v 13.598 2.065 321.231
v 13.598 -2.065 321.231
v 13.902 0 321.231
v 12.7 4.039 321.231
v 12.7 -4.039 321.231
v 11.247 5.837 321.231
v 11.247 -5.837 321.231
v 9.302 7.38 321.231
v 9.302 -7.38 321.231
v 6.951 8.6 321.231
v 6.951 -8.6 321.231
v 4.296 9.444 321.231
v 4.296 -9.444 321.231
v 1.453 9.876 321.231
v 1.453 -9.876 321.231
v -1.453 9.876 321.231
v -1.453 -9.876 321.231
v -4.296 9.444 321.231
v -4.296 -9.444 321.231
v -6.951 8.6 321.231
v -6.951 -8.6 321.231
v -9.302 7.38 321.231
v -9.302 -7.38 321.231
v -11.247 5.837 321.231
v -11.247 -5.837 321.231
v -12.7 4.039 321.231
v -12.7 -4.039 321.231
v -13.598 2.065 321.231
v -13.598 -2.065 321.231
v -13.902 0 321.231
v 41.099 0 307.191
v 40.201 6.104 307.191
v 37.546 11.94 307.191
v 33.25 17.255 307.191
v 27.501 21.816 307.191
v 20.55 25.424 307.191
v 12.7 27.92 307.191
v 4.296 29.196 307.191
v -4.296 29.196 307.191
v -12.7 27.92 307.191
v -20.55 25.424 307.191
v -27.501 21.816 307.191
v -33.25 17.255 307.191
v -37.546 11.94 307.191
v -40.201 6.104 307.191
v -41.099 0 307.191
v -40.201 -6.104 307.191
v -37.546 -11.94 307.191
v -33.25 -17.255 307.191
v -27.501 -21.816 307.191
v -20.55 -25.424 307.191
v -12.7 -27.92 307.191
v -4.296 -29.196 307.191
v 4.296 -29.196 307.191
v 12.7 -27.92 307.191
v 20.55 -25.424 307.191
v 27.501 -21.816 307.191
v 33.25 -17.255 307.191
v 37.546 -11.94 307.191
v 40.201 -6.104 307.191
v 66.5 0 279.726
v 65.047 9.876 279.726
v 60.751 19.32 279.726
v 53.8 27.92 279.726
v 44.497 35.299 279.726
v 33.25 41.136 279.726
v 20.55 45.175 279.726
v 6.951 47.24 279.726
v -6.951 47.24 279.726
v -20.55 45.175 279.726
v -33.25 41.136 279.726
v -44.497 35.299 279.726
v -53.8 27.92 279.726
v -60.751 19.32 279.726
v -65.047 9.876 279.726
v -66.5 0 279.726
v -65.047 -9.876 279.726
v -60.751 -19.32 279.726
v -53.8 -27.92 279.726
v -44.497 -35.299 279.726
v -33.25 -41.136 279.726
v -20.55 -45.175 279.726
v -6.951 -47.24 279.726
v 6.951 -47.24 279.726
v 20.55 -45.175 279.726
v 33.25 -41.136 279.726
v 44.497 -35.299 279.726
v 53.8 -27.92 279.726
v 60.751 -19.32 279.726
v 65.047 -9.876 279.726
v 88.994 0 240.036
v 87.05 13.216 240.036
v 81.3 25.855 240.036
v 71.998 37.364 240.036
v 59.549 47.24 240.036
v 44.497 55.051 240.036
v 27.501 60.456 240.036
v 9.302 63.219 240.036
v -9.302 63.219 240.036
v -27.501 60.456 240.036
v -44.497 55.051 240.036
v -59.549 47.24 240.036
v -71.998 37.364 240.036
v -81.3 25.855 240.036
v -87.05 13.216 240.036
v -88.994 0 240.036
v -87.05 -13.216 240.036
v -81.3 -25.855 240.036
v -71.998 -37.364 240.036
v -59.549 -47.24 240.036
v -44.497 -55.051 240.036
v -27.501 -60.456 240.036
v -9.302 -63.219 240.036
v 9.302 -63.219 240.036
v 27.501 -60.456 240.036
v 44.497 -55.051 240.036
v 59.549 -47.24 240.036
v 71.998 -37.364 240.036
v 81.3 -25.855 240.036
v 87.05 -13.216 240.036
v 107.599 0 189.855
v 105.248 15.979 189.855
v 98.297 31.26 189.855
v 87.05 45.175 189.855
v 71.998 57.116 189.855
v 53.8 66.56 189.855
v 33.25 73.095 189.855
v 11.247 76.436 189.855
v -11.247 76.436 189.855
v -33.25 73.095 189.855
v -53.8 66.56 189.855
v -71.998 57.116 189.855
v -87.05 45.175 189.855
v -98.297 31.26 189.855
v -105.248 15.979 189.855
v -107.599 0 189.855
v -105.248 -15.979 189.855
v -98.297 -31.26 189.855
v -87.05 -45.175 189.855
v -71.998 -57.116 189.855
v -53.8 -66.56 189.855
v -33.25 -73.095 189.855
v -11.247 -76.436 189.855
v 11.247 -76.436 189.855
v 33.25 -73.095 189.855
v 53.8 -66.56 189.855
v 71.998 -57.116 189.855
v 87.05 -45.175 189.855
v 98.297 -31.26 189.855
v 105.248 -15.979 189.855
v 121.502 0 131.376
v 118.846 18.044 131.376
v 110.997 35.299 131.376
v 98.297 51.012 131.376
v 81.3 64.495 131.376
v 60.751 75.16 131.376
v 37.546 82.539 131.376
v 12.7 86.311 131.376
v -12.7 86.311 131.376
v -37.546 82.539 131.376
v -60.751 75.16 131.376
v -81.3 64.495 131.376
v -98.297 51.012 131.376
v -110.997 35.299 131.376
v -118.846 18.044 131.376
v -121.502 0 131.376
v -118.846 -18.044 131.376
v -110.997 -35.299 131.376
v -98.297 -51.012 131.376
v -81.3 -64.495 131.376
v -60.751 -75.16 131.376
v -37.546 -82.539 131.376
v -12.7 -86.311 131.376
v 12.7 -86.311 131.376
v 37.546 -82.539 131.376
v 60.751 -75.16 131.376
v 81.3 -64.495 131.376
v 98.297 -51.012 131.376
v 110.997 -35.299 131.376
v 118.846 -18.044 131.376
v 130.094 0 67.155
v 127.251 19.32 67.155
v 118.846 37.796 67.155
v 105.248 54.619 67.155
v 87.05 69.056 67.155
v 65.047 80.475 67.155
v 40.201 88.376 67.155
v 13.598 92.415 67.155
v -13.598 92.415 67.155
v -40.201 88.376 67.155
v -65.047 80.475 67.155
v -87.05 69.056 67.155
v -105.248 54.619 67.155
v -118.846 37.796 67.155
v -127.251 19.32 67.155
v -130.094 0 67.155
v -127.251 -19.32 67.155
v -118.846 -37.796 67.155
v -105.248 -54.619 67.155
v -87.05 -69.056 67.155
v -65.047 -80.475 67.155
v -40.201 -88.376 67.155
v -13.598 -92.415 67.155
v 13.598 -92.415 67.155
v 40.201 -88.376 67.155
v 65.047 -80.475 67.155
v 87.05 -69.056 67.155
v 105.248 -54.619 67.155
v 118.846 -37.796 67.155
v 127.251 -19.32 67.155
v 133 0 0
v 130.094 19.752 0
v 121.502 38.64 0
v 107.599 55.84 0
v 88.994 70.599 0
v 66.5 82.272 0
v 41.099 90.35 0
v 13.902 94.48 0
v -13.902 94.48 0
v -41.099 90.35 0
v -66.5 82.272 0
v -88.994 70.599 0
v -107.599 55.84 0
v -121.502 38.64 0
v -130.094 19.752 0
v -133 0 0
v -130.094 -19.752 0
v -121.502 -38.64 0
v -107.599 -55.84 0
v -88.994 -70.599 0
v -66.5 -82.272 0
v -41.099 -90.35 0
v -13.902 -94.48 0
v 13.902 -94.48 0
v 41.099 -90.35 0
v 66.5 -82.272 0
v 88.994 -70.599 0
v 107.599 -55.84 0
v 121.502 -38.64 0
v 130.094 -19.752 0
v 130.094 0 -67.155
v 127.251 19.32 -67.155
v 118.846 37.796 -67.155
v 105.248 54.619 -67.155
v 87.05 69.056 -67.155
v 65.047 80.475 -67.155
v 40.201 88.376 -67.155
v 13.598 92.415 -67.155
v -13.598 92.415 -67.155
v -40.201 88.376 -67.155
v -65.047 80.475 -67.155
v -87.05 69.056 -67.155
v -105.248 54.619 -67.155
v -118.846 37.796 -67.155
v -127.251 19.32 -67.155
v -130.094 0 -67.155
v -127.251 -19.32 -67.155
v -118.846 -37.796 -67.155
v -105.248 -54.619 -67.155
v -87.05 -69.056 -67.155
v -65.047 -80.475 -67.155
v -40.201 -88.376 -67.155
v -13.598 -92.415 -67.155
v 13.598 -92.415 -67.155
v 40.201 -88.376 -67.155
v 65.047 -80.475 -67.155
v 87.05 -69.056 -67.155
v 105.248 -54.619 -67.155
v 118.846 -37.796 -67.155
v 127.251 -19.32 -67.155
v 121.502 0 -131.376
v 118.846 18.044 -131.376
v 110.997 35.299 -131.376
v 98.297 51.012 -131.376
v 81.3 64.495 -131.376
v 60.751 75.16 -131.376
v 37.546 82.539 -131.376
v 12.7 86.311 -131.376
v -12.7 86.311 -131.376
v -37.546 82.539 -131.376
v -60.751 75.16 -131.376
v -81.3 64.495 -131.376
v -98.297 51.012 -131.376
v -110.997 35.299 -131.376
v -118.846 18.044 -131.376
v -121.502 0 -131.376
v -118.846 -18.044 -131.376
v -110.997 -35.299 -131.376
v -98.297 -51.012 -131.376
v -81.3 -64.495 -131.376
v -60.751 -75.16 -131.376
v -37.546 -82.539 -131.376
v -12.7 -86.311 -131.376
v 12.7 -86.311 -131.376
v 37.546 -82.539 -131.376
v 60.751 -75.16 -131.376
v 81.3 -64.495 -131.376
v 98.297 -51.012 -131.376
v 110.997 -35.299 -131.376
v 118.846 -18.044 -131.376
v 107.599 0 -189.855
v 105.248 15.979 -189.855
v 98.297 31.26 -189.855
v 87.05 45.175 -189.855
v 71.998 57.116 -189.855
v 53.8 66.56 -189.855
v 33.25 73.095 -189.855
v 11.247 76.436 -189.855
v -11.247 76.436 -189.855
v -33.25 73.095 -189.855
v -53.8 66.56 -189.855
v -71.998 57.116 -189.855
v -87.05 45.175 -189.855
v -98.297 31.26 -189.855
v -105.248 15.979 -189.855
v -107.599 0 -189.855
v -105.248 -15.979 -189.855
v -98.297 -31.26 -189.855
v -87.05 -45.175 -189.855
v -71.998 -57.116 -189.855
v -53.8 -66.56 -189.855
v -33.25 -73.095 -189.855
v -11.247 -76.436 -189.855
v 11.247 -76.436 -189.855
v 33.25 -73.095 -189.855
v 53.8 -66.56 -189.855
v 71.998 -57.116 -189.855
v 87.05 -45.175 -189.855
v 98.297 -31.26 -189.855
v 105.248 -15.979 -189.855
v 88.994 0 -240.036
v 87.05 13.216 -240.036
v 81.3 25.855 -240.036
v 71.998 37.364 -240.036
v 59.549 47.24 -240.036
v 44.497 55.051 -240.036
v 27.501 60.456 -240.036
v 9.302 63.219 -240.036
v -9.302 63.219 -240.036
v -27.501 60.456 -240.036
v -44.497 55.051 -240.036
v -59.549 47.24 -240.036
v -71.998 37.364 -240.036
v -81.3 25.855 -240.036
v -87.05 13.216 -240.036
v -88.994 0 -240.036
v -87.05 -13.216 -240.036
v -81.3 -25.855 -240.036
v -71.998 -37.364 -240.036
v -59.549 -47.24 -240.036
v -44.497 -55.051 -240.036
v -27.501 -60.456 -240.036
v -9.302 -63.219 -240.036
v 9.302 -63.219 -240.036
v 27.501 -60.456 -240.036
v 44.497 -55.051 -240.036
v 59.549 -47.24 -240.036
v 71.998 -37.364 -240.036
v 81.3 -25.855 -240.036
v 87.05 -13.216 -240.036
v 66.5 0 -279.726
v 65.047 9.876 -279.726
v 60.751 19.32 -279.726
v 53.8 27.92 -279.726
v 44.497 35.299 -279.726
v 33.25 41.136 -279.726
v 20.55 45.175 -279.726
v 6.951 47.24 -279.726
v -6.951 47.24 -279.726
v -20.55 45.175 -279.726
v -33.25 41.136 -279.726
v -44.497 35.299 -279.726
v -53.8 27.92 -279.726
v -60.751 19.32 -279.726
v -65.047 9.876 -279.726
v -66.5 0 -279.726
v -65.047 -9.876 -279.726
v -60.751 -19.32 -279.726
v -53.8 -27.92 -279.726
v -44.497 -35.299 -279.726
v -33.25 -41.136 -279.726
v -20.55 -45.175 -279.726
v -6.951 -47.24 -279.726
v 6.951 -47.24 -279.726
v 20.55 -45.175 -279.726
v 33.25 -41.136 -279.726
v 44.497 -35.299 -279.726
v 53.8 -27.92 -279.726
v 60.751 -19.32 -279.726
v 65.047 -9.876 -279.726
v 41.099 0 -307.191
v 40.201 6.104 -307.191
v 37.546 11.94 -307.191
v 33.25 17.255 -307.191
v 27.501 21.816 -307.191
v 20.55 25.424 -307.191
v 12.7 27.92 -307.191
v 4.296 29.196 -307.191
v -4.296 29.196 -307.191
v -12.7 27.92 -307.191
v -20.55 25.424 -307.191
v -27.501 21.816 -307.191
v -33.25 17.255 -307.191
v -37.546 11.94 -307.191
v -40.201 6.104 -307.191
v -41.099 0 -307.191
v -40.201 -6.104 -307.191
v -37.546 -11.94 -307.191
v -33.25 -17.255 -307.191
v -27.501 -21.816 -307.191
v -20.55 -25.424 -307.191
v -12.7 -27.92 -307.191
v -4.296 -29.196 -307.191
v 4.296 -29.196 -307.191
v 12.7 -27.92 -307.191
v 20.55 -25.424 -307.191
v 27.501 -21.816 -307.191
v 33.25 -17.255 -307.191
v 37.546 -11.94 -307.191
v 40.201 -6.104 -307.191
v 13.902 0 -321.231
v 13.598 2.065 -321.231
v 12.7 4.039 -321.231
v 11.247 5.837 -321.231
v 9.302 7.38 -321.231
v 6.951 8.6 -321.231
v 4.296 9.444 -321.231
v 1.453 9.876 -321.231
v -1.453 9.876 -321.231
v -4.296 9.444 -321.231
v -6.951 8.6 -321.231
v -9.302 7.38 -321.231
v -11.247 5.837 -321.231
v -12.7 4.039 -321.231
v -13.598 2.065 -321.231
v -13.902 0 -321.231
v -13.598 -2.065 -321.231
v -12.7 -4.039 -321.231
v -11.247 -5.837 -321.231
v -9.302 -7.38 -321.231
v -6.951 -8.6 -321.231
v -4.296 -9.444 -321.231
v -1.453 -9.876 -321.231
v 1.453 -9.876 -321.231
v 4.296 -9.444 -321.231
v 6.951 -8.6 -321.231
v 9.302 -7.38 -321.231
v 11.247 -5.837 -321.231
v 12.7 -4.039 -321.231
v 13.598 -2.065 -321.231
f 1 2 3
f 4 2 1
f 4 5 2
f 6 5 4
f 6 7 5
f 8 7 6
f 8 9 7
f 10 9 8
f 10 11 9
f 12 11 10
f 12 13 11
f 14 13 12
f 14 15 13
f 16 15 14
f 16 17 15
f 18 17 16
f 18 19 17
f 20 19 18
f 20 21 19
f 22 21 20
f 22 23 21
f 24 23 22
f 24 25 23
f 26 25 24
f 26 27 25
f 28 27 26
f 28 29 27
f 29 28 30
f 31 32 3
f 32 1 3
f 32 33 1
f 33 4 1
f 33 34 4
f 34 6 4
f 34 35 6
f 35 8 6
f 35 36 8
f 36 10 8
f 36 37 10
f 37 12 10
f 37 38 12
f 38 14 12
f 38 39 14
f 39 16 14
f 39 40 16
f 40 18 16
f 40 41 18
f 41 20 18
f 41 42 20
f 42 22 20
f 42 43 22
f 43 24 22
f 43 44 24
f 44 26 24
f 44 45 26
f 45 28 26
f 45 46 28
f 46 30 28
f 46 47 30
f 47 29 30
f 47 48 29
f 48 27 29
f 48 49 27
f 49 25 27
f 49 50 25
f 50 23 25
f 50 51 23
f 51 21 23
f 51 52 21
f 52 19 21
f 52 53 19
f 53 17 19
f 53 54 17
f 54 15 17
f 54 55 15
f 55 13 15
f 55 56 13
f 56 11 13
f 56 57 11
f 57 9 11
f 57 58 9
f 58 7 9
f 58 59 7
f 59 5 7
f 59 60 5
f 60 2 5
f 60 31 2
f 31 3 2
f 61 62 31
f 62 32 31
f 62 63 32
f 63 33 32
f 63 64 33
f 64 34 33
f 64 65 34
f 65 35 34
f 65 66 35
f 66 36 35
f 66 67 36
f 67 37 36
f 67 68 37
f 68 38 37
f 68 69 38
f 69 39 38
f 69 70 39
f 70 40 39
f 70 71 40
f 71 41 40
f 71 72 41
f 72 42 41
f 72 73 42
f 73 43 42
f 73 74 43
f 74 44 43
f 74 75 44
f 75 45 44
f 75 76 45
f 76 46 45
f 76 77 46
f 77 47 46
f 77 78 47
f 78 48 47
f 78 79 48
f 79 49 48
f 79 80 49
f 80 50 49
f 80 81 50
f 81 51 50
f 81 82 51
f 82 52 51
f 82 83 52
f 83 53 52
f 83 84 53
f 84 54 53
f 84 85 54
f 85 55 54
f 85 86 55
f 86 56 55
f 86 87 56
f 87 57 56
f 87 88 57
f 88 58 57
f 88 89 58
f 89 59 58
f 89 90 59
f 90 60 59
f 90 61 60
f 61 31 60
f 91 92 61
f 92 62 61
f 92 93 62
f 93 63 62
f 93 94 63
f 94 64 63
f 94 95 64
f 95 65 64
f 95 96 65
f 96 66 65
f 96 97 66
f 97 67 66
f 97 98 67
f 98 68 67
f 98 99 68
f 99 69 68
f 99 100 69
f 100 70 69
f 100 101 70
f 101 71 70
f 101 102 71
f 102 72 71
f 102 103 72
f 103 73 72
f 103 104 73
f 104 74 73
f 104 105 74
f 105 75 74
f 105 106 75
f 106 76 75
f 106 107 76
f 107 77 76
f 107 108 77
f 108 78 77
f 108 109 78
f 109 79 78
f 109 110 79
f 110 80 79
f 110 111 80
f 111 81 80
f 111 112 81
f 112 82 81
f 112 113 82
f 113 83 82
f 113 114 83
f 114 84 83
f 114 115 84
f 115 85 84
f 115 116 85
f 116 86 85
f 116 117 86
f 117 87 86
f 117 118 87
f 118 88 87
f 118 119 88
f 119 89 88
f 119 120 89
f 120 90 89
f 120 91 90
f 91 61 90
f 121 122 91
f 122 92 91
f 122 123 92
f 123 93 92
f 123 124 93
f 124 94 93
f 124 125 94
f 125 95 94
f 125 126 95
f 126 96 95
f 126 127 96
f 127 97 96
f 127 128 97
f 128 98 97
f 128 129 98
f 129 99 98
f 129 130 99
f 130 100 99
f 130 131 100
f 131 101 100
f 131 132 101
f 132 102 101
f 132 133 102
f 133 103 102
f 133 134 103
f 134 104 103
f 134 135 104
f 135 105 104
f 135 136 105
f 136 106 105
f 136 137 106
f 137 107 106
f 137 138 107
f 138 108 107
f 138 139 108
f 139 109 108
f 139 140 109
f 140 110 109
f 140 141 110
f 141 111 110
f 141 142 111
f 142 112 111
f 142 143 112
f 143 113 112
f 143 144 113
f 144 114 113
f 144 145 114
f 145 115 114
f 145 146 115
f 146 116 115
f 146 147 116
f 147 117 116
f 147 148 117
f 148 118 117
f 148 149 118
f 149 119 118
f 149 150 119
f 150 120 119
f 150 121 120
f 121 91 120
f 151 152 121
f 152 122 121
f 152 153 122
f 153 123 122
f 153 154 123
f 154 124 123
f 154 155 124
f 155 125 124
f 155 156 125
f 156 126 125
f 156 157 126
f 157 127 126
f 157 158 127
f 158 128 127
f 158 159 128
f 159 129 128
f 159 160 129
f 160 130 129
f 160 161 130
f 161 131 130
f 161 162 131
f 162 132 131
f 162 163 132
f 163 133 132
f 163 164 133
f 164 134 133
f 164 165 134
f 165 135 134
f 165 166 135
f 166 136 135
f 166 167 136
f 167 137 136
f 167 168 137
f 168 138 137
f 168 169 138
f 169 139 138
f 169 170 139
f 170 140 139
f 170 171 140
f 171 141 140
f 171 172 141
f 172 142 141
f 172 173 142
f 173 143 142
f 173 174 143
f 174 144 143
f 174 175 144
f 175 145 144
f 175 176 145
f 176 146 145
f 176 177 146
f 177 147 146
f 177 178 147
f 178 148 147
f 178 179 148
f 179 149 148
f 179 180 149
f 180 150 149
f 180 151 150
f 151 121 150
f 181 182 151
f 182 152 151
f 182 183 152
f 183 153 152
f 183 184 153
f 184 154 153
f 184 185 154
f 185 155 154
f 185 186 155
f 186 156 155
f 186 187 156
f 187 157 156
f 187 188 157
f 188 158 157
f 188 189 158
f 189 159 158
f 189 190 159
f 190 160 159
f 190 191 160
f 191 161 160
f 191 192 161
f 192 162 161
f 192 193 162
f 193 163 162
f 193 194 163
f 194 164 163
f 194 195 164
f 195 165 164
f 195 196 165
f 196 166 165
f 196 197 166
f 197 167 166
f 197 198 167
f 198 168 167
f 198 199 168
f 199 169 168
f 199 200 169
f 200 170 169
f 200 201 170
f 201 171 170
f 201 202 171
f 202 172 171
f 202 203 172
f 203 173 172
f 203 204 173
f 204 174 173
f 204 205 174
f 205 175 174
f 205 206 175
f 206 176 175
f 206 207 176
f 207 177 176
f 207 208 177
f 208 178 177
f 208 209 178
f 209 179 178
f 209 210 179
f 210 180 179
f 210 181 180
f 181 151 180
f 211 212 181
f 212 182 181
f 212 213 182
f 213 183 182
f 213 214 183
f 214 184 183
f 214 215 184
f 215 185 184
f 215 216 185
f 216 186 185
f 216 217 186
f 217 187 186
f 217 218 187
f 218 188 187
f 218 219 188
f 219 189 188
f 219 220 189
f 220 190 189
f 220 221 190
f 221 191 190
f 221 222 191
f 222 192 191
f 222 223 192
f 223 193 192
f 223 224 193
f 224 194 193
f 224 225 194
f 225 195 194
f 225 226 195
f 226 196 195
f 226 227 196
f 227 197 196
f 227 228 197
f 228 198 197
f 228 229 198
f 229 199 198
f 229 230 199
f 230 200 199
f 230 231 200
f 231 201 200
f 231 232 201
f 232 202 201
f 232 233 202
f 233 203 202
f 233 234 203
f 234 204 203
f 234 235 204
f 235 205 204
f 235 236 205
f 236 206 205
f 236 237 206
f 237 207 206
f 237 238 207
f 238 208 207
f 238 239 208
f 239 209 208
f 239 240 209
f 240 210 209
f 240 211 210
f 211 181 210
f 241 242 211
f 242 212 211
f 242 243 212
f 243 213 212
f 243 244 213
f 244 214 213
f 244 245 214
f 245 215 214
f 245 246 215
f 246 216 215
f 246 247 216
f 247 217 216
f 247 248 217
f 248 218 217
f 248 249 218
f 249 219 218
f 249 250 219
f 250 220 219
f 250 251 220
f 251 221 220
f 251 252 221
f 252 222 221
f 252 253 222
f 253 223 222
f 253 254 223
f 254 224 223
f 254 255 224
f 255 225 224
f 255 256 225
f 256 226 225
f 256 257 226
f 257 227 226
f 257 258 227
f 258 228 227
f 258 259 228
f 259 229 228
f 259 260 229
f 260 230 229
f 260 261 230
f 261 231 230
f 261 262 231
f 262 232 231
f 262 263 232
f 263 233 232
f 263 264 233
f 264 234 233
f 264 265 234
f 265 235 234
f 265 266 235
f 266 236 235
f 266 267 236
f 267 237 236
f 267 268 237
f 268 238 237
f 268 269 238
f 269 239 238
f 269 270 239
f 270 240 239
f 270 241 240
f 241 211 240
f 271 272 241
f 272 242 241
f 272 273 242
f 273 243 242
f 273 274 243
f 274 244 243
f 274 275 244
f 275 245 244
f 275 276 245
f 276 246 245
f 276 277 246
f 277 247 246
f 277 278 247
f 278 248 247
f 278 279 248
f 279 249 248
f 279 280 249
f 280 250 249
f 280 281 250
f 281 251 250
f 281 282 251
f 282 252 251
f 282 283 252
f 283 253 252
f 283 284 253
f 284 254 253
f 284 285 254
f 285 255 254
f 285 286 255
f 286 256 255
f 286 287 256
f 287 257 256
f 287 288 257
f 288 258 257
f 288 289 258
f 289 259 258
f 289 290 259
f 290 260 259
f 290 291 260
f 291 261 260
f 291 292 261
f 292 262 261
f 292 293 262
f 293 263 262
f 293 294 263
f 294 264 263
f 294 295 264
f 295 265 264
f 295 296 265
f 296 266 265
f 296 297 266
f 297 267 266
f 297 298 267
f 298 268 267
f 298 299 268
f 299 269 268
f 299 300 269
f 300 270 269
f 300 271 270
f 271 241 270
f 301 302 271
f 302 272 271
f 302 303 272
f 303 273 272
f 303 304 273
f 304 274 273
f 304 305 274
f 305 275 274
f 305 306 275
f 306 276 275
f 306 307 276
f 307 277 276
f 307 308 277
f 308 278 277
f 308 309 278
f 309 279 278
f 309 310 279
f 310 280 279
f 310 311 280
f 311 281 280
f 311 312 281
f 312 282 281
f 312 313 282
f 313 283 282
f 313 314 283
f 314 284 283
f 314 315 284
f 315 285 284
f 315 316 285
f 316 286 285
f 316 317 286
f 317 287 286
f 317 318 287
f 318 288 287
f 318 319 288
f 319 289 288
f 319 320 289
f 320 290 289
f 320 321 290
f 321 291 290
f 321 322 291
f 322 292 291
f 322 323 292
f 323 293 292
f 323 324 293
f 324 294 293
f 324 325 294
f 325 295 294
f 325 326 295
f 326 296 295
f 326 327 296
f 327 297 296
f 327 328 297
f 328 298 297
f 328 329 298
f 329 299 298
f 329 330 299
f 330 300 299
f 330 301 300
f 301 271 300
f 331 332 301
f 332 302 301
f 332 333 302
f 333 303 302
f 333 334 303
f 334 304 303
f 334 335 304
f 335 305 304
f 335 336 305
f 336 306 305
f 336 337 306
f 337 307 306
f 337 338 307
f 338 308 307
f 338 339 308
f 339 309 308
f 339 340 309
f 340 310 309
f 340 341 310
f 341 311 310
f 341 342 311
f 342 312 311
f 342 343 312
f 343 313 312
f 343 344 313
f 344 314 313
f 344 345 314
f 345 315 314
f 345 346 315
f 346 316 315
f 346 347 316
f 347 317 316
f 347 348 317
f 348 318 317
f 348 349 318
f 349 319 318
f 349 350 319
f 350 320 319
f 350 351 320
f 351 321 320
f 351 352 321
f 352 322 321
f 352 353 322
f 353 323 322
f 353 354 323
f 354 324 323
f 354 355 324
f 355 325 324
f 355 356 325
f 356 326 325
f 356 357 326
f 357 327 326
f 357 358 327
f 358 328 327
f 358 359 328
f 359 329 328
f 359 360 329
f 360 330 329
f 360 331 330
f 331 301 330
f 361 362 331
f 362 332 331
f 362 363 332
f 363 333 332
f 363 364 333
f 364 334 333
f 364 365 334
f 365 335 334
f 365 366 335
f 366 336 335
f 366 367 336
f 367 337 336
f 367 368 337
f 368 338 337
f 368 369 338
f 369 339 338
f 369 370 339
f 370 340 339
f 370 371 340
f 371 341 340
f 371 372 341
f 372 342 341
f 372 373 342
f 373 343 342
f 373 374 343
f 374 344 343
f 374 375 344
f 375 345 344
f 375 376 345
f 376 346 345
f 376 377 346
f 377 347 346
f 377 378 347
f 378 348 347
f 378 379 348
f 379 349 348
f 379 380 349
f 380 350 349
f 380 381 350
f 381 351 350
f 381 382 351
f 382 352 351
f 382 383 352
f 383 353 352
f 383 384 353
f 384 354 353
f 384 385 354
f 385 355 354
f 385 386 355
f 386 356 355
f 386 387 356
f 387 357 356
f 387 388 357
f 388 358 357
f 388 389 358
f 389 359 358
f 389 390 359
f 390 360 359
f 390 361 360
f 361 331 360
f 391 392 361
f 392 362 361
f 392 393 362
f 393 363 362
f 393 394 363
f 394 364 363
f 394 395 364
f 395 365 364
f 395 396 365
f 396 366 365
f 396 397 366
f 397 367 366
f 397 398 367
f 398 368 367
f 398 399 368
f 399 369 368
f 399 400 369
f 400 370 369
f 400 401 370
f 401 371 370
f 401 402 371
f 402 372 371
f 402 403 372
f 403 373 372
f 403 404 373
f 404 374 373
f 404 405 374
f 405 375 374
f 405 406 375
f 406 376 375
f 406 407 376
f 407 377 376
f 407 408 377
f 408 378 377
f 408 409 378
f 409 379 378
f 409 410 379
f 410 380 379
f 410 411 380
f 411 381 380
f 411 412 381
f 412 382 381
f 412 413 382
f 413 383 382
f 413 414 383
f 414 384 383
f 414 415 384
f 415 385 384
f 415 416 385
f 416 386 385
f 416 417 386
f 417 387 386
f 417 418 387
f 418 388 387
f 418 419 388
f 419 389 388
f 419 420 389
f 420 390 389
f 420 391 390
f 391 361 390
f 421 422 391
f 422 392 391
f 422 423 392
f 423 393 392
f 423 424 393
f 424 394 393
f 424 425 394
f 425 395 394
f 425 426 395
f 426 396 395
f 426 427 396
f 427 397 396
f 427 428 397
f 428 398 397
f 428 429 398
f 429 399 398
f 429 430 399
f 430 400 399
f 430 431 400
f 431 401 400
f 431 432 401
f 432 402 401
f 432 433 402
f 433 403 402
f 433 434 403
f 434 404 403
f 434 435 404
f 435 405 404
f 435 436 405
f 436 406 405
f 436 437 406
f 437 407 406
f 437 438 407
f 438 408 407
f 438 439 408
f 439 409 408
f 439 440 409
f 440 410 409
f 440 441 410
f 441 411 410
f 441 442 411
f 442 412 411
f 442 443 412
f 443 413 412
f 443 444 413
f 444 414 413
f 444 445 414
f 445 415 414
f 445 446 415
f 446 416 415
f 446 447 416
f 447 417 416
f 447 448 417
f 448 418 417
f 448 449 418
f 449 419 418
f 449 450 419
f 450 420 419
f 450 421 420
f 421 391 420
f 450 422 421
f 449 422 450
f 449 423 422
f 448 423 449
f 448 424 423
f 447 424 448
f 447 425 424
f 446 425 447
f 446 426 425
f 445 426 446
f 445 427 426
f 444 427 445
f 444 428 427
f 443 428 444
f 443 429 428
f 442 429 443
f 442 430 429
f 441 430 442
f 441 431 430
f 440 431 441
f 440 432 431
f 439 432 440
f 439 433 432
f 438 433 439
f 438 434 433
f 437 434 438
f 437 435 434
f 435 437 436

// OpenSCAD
// Generated by SolidPython 1.0.1 on 2020-07-29 00:46:47


scale(v = [7, 5, 17]) {
	sphere(r = 19);
}
/***********************************************
*********      SolidPython code:      **********
************************************************
 
# import packages: SolidPython
from solid import *
from solid.utils import *
from itertools import chain, combinations, permutations


class Resize:

    def __init__(self, scad_file):
        self.scad_file = scad_file
        #self.scad_file = import_scad(scad_file)
        # cone/cylinder param:
        self.r1 = 0
        self.r2 = 0
        self.h = 0
        # rectangular prism param:
        self.w = 0
        self.l = 0
        # ellipse param:
        self.r = 0

    # import OpenScad code (file name corresponds to shape)


    # classify shape + parameters
    def assign(self, param1, param2, param3):
        if self.scad_file == 'cone.scad':
            self.r1 = param1
            self.r2 = param2
            self.h = param3
        elif self.scad_file == 'cylinder.scad':
            self.r1 = param1
            self.r2 = param2
            self.h = param3
        elif self.scad_file == 'rectangularPrism.scad':
            self.h = param1
            self.l = param2
            self.w = param3
        else:
            self.r = param1
            self.h = param2

    # resize parameters
    def iterate(self):
        x = range(3, 20, 2)
        i = 1
        if self.scad_file == 'cone.scad':
            tempList = list(permutations(x, 2))
            for temp in tempList:
                param1 = temp[0]
                param2 = temp[1]
                filepath = 'produced_scad_files/' + 'cone' + str(param1) + '_' + str(param2) + '_' + '.scad'
                scad_render_to_file(cylinder(h=param1, r1=param2, r2=0), filepath)

        elif self.scad_file == 'cylinder.scad':
            tempList = list(permutations(x, 3))
            for temp in tempList:
                param1 = temp[0]
                param2 = temp[1]
                filepath = 'produced_scad_files/' + 'cylinder' + str(param1) + '_' + str(param2) + '_' + '.scad'
                scad_render_to_file(cylinder(h=param1, r1=param2, r2=param2), filepath)

        elif self.scad_file == 'rectangularPrism.scad':
            tempList = list(permutations(x, 3))
            for temp in tempList:
                param1 = temp[0]
                param2 = temp[1]
                param3 = temp[2]
                filepath = 'produced_scad_files/' + 'rectangularPrism' + str(param1) + '_' + str(param2) + '_' + str(
                    param3) + '.scad'
                scad_render_to_file(cube(size=(param1, param2, param3)), filepath)

        elif self.scad_file == 'ellipse.scad':
            tempList = list(permutations(x, 4))
            for temp in tempList:
                param1 = temp[0]
                param2 = temp[1]
                param3 = temp[2]
                param4 = temp[3]
                filepath = 'produced_scad_files/' + 'ellipse' + str(param1) + '_' + str(param2) + '_' + str(param3) + '_' + str(param4) + '.scad'
                scad_render_to_file(scale([param1, param2, param3])(sphere(r=param4)), filepath)

    def render_to_scadfile(self):
        scad_render_to_file(scad, 'example.scad') 
 
************************************************/
